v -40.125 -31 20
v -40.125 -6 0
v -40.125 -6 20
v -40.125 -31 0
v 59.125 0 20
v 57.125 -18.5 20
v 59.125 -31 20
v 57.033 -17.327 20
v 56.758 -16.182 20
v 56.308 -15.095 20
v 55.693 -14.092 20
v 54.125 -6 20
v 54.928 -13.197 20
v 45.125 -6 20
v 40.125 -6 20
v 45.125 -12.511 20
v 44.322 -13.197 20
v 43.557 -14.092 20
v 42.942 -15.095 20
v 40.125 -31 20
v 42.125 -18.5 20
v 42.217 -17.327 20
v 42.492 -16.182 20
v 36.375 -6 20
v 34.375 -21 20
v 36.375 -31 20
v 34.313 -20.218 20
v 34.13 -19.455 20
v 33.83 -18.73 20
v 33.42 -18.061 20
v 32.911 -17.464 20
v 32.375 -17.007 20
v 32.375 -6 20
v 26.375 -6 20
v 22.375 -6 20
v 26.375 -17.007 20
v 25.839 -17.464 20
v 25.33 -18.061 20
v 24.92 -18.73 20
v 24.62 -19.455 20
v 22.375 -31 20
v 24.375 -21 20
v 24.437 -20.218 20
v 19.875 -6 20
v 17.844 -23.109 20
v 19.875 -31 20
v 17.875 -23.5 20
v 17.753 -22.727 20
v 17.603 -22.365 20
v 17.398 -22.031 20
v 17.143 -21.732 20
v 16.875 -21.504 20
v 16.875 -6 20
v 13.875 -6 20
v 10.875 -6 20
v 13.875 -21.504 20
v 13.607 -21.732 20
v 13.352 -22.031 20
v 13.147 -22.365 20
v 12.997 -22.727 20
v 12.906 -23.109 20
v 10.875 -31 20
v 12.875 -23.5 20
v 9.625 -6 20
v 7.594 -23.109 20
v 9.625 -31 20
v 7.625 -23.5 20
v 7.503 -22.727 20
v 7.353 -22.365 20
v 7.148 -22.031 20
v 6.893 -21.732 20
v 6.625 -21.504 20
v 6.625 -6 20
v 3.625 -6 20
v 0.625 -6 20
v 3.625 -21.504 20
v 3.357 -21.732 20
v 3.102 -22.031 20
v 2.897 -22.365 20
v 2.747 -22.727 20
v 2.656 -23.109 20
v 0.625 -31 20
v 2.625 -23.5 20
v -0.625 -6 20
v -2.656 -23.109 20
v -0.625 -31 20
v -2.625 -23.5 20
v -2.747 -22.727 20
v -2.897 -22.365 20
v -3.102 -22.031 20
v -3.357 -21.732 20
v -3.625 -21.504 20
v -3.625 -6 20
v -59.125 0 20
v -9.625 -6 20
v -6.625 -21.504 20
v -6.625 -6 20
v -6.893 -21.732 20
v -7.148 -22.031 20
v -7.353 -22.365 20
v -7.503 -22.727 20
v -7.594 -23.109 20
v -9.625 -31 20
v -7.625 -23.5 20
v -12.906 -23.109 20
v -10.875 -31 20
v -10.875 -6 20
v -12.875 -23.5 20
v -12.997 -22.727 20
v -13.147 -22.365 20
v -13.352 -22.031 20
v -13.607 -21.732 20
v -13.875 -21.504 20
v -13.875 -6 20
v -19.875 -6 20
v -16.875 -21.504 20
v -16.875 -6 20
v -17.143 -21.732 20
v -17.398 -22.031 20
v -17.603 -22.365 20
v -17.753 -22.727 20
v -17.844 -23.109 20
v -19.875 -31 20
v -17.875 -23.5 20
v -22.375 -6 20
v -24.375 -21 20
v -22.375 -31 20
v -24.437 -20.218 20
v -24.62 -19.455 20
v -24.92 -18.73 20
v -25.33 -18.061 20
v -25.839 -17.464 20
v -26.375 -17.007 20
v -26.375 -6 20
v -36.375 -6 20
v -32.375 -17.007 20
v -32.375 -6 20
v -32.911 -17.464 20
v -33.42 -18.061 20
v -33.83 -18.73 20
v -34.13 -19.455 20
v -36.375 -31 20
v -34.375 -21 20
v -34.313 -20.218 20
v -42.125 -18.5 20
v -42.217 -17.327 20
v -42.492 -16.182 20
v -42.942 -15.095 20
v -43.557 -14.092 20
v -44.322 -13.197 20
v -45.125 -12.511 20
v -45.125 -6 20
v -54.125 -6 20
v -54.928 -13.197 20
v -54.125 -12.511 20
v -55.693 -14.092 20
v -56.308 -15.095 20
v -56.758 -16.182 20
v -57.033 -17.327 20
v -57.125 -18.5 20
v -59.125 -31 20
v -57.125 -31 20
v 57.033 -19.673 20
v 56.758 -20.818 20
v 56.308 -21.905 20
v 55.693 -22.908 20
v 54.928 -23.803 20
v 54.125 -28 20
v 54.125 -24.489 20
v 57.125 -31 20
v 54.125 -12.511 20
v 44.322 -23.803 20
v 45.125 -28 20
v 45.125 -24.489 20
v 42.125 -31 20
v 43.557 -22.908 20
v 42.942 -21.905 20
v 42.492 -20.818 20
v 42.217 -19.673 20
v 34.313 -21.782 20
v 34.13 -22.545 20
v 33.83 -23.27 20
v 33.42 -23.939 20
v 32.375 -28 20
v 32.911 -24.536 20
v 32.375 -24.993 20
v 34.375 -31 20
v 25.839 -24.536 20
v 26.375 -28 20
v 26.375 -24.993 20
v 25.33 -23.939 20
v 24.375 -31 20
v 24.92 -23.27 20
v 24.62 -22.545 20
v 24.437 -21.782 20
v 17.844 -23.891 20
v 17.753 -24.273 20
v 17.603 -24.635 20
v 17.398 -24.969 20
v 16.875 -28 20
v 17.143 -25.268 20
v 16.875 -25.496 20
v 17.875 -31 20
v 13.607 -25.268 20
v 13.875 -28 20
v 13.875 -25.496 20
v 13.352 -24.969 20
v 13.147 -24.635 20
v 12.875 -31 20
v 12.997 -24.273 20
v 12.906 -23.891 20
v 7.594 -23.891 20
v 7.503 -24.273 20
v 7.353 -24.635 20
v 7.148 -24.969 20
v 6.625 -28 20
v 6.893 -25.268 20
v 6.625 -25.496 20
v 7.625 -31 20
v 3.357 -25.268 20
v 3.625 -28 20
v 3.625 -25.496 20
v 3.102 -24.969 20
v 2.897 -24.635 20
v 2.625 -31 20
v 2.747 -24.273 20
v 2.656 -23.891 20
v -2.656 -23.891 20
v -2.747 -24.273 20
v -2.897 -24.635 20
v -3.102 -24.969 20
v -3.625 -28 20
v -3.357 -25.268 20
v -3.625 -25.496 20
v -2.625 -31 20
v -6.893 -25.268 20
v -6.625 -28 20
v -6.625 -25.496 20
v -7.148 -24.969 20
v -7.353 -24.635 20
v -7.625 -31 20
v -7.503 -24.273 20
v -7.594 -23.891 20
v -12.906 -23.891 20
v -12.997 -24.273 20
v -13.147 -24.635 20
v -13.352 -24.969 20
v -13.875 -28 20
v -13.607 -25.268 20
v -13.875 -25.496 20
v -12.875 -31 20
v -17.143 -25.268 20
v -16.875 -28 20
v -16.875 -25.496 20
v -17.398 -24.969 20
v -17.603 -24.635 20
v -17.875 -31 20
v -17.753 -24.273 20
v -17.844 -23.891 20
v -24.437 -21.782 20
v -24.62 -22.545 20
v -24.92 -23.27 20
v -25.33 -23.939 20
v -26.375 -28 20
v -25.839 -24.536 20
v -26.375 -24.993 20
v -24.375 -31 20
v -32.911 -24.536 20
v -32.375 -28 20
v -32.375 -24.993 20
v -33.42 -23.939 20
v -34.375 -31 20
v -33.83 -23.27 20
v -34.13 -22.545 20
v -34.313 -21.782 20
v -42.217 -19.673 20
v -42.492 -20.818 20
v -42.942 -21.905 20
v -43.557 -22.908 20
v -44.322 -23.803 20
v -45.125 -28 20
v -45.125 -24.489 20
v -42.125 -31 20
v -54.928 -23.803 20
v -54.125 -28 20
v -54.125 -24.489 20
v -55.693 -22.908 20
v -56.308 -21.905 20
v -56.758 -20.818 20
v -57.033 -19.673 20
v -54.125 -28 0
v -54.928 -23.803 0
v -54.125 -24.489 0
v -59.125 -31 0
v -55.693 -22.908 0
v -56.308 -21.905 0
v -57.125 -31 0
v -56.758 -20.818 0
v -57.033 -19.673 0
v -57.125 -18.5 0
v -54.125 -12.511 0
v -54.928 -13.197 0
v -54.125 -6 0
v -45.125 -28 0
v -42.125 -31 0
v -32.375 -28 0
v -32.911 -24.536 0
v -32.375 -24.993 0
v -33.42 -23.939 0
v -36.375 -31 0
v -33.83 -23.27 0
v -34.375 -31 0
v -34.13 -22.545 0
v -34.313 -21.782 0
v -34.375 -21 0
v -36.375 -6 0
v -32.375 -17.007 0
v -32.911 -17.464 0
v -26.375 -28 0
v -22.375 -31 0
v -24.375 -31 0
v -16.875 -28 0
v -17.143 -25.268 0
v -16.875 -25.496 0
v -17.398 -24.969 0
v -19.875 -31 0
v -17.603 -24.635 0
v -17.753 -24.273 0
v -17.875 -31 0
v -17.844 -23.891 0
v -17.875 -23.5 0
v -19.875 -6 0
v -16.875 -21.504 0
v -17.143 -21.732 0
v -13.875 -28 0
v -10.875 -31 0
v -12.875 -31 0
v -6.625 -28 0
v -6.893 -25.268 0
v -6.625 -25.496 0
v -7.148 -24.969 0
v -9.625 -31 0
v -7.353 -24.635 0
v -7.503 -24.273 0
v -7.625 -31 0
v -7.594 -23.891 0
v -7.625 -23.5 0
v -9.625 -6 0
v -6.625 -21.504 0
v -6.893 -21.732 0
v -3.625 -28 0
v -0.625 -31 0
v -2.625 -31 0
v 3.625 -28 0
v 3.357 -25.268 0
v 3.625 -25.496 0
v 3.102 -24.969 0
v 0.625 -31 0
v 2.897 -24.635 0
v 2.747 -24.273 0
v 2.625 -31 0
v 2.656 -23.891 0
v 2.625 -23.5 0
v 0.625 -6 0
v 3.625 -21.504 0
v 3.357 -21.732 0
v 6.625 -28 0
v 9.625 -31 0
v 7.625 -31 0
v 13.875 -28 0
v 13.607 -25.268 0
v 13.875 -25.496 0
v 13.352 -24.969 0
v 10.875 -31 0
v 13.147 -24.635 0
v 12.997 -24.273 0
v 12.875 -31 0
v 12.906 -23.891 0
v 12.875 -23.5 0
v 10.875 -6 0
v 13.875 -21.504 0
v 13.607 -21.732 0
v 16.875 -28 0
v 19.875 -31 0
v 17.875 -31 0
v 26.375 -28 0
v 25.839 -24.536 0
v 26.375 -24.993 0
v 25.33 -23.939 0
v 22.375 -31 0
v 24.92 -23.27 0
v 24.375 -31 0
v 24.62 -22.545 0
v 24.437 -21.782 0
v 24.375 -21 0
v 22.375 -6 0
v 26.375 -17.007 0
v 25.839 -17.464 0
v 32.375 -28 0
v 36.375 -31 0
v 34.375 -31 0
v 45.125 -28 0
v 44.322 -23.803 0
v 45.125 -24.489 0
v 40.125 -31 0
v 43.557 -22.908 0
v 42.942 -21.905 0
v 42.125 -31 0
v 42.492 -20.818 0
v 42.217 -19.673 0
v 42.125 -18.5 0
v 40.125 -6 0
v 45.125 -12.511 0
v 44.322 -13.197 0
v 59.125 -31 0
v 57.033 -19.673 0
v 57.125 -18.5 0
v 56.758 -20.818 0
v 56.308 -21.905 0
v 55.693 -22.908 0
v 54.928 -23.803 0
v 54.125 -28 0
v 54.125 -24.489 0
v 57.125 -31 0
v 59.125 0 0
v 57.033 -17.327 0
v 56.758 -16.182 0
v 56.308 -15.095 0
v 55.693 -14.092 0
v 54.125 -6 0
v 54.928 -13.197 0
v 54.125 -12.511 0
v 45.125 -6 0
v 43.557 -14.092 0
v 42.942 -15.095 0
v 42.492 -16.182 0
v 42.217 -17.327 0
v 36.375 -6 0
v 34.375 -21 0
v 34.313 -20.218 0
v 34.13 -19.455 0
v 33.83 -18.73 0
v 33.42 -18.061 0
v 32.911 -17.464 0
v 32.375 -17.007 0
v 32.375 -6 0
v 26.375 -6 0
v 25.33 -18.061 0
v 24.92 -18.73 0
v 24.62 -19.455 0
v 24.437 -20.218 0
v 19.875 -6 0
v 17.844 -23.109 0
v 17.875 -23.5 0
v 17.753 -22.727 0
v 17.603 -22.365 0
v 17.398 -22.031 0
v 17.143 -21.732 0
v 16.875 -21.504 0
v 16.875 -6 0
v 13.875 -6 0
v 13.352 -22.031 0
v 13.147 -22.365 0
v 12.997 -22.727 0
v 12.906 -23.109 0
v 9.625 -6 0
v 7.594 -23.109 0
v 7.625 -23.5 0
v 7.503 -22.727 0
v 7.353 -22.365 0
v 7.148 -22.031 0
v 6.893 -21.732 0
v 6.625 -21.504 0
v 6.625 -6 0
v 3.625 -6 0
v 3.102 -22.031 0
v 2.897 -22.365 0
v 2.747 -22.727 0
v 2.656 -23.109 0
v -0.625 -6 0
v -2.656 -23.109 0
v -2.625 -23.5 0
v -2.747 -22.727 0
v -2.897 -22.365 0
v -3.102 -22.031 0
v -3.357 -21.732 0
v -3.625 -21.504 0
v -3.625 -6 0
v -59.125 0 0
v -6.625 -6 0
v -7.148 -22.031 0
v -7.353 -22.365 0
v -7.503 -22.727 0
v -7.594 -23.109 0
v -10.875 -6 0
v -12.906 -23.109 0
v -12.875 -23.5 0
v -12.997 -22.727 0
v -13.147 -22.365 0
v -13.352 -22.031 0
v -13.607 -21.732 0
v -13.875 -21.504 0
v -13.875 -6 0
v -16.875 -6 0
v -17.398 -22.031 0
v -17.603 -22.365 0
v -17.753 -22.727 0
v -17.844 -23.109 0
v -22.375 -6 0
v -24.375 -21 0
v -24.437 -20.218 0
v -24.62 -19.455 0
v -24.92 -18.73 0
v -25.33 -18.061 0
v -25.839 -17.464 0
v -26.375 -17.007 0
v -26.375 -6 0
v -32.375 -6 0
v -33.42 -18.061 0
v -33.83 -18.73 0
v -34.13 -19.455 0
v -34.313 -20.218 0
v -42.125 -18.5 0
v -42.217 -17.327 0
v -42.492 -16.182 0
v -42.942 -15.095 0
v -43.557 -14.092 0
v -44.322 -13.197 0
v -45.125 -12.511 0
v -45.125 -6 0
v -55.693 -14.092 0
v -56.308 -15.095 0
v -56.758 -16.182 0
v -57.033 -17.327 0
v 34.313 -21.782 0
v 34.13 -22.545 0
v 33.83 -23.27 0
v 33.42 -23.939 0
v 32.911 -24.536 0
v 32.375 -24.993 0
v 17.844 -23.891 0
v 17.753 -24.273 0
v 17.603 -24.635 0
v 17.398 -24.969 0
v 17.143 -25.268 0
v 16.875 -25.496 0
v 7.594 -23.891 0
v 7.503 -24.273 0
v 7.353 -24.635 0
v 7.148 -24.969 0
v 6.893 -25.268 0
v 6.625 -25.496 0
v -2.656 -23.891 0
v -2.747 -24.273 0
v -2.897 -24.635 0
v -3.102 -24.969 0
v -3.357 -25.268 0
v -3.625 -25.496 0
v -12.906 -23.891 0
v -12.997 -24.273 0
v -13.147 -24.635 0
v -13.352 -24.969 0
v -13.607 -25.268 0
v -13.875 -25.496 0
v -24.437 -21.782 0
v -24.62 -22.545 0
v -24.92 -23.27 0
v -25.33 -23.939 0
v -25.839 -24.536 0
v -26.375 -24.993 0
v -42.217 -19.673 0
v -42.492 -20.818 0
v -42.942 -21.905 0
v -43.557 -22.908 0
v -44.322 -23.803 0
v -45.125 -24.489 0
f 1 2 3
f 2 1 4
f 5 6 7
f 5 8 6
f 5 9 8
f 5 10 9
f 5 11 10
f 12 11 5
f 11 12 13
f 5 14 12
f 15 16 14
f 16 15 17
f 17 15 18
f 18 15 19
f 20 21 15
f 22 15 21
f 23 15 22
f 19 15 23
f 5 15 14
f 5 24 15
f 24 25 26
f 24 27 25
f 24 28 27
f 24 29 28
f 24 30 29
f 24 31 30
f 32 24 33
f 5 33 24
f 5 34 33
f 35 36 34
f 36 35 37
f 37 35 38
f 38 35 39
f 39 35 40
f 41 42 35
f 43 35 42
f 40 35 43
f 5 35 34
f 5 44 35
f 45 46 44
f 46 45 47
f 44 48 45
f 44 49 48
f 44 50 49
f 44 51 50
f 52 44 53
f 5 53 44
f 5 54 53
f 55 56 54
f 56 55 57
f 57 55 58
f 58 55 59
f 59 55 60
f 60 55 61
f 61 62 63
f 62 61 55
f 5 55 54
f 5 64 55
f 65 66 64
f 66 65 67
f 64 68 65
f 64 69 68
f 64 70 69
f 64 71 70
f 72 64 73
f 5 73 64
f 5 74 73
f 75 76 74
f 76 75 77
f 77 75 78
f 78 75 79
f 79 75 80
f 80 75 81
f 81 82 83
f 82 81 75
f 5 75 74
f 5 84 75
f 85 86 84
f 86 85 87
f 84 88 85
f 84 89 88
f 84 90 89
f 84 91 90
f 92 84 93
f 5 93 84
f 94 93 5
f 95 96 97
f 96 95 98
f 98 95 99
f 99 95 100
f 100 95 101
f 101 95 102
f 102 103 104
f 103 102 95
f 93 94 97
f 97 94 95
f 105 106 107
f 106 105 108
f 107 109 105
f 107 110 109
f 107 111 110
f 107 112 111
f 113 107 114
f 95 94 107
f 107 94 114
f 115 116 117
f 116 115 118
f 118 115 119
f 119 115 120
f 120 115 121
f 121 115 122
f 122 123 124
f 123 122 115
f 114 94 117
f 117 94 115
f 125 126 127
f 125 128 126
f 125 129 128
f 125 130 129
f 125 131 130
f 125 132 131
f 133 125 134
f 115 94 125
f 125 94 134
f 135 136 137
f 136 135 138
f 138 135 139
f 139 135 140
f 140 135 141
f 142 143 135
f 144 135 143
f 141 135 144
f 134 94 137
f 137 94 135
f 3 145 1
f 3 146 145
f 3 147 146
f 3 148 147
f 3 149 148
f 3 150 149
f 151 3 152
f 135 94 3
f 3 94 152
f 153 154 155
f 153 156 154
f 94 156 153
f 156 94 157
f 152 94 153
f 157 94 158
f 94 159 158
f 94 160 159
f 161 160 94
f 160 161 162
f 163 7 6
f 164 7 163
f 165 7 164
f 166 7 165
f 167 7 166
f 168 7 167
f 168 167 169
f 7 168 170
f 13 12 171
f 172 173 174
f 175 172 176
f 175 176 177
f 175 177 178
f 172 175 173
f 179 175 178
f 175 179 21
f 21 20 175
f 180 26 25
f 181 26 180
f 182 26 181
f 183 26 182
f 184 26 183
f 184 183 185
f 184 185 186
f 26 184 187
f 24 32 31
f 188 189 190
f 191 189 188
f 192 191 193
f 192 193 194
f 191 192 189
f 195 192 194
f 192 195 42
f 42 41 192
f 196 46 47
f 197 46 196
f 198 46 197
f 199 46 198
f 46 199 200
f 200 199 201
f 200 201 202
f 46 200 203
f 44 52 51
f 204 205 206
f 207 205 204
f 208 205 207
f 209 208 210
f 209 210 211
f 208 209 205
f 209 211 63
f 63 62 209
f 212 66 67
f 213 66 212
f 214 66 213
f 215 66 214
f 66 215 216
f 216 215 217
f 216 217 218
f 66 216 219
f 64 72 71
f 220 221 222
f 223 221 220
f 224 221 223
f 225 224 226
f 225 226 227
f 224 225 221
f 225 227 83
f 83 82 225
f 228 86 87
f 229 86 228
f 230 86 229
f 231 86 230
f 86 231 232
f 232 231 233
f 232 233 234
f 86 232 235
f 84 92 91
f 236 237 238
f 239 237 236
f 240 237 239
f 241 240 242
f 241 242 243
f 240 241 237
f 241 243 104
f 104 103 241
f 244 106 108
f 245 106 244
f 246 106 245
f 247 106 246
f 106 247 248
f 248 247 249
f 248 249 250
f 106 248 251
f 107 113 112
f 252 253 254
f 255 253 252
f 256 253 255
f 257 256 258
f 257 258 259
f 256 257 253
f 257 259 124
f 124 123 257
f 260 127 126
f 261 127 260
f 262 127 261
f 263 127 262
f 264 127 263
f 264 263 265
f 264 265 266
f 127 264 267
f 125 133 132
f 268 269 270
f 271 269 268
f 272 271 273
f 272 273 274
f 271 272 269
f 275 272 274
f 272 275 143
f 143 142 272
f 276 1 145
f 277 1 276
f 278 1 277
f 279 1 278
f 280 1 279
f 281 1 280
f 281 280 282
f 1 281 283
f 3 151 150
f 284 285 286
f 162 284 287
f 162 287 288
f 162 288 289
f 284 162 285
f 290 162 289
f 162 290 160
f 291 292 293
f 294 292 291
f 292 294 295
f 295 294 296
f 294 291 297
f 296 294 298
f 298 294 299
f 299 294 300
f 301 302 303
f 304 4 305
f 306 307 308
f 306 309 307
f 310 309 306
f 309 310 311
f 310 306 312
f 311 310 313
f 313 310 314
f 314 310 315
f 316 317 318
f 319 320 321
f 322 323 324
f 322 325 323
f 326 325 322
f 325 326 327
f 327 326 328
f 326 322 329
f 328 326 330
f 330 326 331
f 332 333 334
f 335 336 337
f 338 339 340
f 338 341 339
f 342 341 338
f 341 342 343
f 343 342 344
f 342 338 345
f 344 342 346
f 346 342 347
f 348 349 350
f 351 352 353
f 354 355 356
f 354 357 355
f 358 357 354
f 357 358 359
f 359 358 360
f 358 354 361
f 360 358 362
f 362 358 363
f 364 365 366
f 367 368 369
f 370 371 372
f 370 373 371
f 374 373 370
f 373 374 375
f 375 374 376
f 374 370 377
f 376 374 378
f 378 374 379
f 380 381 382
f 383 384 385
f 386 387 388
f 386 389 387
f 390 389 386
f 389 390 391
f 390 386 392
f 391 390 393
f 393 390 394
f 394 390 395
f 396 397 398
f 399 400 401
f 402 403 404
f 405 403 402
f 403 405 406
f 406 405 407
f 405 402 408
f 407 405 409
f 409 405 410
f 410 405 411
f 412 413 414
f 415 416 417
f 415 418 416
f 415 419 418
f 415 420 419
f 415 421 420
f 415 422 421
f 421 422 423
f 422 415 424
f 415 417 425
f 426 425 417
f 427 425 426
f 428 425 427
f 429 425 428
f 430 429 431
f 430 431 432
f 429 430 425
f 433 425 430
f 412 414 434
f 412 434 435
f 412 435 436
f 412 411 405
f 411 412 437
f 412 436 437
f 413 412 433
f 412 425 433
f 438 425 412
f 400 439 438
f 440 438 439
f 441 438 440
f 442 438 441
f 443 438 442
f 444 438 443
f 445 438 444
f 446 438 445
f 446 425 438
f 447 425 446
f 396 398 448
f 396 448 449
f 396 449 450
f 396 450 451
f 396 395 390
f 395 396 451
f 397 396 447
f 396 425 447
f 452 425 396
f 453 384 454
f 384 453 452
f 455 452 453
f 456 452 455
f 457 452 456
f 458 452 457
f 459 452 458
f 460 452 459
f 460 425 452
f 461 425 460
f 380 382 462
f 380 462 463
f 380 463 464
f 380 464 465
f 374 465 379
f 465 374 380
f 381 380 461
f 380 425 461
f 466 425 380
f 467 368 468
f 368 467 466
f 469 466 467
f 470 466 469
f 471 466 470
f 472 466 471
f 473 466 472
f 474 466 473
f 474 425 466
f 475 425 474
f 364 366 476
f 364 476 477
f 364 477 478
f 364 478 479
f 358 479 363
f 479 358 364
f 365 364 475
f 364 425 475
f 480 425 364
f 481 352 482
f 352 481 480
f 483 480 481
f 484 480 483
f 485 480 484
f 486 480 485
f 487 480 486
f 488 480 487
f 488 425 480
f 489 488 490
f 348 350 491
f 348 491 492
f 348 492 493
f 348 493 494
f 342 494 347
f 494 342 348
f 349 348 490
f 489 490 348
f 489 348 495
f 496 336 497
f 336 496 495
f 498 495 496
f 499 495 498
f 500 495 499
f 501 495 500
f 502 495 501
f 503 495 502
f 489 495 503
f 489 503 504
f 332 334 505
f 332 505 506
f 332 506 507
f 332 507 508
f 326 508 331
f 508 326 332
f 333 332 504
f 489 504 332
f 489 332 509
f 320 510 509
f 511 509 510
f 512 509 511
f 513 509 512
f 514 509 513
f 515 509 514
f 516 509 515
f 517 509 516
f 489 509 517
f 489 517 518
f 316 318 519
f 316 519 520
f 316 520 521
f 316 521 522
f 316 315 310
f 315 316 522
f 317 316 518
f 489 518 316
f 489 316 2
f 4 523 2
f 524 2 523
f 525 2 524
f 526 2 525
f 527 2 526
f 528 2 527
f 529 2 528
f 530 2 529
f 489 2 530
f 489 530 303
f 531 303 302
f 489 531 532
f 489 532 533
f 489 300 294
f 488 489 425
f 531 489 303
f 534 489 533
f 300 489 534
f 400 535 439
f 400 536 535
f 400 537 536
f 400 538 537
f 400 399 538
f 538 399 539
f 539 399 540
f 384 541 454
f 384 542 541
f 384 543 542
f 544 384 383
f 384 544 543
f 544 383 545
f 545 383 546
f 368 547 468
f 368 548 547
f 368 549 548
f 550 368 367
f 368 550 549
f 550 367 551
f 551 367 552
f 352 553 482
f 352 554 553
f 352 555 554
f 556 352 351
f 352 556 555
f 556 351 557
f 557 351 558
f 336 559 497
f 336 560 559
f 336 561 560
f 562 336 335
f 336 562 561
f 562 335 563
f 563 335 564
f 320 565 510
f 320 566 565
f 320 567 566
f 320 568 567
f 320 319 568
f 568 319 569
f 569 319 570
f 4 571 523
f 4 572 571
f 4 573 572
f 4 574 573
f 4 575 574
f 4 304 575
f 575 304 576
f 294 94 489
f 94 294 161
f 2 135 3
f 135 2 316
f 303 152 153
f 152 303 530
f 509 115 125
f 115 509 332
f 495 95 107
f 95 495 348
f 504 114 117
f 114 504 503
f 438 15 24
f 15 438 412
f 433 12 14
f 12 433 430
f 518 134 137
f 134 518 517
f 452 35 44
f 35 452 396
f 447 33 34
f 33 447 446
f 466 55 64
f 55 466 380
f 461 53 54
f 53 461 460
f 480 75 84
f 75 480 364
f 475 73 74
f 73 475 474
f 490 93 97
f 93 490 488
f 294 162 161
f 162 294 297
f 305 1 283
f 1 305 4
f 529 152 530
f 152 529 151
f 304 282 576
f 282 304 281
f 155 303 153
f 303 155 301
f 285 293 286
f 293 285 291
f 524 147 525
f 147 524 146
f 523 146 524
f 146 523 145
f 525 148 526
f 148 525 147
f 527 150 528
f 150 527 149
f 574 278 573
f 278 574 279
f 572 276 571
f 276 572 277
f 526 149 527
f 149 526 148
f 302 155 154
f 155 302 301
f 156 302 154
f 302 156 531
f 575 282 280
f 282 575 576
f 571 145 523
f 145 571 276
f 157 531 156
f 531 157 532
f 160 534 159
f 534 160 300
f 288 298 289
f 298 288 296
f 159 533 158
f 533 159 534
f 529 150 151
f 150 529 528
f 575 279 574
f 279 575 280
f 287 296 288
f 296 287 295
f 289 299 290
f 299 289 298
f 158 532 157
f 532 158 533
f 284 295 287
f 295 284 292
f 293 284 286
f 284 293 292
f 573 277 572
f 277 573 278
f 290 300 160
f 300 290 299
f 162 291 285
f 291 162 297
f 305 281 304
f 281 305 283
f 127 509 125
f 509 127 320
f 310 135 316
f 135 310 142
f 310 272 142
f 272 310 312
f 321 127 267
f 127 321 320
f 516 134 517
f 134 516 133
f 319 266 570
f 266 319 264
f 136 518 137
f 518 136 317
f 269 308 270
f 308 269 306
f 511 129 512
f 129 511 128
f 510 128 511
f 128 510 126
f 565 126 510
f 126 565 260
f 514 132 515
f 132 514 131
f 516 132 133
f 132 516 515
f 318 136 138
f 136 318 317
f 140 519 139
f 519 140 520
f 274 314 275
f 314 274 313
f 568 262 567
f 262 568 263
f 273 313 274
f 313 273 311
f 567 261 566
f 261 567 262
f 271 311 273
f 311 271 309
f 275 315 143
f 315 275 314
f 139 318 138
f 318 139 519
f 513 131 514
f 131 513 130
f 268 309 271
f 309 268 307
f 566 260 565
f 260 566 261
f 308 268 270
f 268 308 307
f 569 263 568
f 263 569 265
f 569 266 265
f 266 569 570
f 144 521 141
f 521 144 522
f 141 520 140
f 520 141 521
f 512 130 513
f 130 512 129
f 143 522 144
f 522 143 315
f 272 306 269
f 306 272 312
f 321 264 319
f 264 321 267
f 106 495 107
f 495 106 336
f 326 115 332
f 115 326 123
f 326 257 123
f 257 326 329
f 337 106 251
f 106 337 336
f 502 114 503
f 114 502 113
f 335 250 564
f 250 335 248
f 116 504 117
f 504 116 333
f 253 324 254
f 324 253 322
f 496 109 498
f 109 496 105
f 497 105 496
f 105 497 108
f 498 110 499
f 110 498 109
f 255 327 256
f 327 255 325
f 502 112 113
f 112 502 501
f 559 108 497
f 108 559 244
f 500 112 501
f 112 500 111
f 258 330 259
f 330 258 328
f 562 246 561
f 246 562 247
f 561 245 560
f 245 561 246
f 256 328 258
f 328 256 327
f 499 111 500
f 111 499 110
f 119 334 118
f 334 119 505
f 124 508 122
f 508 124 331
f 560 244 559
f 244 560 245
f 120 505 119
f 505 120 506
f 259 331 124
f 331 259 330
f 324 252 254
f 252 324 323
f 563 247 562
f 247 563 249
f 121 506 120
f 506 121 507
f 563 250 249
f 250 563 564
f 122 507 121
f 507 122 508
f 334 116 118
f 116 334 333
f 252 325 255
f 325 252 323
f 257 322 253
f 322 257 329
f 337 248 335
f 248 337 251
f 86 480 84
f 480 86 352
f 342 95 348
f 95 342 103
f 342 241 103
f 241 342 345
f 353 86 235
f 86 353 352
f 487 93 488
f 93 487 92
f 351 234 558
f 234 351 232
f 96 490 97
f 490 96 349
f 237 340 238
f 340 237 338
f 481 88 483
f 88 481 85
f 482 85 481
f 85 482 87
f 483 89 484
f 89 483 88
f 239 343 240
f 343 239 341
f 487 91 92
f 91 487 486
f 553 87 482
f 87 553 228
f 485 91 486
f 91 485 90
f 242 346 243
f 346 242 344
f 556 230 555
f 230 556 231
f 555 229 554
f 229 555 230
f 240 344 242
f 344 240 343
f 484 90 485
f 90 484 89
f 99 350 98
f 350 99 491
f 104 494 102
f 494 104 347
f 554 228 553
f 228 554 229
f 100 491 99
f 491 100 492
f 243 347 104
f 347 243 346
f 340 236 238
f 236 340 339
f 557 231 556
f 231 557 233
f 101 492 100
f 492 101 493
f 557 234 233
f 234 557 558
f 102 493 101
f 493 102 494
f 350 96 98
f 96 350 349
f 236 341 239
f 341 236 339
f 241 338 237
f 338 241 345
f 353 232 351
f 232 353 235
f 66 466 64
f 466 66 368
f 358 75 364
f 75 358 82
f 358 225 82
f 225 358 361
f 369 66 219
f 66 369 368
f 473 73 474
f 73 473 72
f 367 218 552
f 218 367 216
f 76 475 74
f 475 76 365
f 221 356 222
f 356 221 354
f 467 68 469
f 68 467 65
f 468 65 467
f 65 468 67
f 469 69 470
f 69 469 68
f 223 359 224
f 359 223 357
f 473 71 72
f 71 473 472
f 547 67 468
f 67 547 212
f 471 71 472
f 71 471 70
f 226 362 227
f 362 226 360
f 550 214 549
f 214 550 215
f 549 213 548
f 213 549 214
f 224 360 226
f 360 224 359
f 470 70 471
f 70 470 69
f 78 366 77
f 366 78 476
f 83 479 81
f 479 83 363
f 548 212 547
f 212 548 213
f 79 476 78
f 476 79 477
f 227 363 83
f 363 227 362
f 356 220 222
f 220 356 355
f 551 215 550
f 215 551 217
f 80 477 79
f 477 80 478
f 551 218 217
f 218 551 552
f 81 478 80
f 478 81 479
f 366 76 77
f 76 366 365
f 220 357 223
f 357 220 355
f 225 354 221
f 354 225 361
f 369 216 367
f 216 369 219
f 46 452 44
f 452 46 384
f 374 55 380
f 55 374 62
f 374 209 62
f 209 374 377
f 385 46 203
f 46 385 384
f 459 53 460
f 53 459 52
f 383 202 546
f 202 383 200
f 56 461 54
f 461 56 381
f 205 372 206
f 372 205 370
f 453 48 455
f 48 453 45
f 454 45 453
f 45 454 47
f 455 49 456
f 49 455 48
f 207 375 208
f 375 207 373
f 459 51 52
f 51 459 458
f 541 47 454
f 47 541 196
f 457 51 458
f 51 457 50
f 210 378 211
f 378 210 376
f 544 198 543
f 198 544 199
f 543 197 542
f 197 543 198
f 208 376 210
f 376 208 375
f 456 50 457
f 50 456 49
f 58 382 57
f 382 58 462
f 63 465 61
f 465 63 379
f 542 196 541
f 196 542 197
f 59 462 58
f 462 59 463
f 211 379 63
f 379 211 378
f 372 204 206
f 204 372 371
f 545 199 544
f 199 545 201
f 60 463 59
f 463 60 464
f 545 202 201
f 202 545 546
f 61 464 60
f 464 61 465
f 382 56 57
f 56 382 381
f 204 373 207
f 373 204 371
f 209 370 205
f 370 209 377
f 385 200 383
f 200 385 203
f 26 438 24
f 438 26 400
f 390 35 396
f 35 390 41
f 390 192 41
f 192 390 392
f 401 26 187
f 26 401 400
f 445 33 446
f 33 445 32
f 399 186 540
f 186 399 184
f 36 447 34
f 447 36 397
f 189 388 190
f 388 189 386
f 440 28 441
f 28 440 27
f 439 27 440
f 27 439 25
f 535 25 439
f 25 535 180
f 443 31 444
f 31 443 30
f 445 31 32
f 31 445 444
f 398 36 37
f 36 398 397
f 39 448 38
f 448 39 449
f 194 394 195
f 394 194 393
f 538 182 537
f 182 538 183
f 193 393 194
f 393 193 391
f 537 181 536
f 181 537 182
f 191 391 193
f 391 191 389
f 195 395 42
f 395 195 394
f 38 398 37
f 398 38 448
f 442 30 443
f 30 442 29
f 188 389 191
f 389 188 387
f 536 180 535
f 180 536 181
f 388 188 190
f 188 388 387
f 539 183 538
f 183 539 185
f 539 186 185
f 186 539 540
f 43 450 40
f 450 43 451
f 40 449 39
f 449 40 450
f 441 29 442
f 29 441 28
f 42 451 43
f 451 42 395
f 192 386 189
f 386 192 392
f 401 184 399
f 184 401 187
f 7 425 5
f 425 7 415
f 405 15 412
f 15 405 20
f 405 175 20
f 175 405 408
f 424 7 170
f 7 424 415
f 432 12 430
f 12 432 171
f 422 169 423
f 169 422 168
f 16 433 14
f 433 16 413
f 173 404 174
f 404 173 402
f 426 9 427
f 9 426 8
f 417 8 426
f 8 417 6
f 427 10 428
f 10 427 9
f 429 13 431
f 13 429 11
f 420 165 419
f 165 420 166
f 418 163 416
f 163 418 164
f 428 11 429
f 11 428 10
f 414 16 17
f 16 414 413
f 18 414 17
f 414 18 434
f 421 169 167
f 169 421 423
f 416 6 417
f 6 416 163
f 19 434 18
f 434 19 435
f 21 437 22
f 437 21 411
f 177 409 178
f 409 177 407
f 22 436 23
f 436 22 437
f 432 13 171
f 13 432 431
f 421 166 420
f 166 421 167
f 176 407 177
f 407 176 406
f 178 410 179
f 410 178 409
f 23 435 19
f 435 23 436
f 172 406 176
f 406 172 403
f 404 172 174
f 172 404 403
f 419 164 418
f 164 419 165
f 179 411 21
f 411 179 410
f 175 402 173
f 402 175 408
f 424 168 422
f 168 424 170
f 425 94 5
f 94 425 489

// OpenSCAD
$fn = 40;

wireDiams = [15,10,5,5,5,5,10,15]; //wire 

gapFact = 0.6; //gap factor

wallThkFact = 0.1; //wall thickness factor
wallThkMin = 2; //min wall thickness
h1 =3;
h2 =2;
h3 =5; 

baseHeight = 6; //height of the base

hasScrewHoles = true;
screwHoleDiam =2;

//Calcuated constants
maxDiam = max(wireDiams);
clipHeight = maxDiam+h1+h2+h3;

thickness=20; //thickness

function clearance(d) = clipHeight*sin(asin(((d-(d*gapFact))/2)/(h3+maxDiam)));
clearances = [for (d =wireDiams)clearance(d)];

clipLengths = [for(d=wireDiams)d+2*max([wallThkMin,d*wallThkFact])];

centerSpacing = [for(i=[0:1:len(wireDiams)-2]) clipLengths[i]/2+clipLengths[i+1]/2+max([clearances[i],clearances[i+1]])];

function addN(v,n, i = 0, r = 0) = i < n ? addN(v,n, i + 1, r + v[i]) : r;
offsets = [for(i=[0:1:len(wireDiams)-1]) addN(centerSpacing,i)];


module clip(diam){

    l1=diam*gapFact;
    wallThk = max([wallThkMin,diam*wallThkFact]); //wall thickness
    l0 = diam+2*wallThk;  //totalwidth
    rot = asin(((diam-l1)/2)/(h3+maxDiam)); //max clip rotation
    clear = clipHeight*sin(rot); //required clearance

    translate([0,-clipHeight+h1+h2,0]){

        translate([0,clipHeight/2-h1-h2,0]){
            translate([clear/2+l0/2,0,0]){
                %cube([clear,clipHeight,thickness],true);
            }

            translate([-(clear/2+l0/2),0,0]){
                %cube([clear,clipHeight,thickness],true);
            }
        }

        difference(){
            translate([0,clipHeight/2-h1-h2,0]){
                cube([l0,clipHeight,thickness],true); //gap    
            }
            translate([0,clipHeight/2-h1-h2,0]){
                cube([l1,clipHeight,thickness],true); //gap    
            }
            translate([0,diam/2,0]){
                cylinder(h=thickness, d=diam,  center = true);
            }
            linear_extrude(height=thickness,center=true){
            polygon([[-diam/2,-h1-h2],[diam/2,-h1-h2],[l1/2,-h2],[-l1/2,-h2]]);
            }
        }
    }
}

clipsLength = clipLengths[0]/2+clipLengths[len(clipLengths)-1]/2+ addN(centerSpacing,len(centerSpacing));


baseLength = clipsLength;


translate([0,-baseHeight/2,thickness/2]){
    cube([baseLength,baseHeight,thickness],true);
}



translate([clipLengths[0]/2-clipsLength/2,-baseHeight,thickness/2]){

    for(i = [0:1:len(wireDiams)-1]){
        translate([offsets[i],0,0]){
            clip(wireDiams[i]);
        }

    }
}
